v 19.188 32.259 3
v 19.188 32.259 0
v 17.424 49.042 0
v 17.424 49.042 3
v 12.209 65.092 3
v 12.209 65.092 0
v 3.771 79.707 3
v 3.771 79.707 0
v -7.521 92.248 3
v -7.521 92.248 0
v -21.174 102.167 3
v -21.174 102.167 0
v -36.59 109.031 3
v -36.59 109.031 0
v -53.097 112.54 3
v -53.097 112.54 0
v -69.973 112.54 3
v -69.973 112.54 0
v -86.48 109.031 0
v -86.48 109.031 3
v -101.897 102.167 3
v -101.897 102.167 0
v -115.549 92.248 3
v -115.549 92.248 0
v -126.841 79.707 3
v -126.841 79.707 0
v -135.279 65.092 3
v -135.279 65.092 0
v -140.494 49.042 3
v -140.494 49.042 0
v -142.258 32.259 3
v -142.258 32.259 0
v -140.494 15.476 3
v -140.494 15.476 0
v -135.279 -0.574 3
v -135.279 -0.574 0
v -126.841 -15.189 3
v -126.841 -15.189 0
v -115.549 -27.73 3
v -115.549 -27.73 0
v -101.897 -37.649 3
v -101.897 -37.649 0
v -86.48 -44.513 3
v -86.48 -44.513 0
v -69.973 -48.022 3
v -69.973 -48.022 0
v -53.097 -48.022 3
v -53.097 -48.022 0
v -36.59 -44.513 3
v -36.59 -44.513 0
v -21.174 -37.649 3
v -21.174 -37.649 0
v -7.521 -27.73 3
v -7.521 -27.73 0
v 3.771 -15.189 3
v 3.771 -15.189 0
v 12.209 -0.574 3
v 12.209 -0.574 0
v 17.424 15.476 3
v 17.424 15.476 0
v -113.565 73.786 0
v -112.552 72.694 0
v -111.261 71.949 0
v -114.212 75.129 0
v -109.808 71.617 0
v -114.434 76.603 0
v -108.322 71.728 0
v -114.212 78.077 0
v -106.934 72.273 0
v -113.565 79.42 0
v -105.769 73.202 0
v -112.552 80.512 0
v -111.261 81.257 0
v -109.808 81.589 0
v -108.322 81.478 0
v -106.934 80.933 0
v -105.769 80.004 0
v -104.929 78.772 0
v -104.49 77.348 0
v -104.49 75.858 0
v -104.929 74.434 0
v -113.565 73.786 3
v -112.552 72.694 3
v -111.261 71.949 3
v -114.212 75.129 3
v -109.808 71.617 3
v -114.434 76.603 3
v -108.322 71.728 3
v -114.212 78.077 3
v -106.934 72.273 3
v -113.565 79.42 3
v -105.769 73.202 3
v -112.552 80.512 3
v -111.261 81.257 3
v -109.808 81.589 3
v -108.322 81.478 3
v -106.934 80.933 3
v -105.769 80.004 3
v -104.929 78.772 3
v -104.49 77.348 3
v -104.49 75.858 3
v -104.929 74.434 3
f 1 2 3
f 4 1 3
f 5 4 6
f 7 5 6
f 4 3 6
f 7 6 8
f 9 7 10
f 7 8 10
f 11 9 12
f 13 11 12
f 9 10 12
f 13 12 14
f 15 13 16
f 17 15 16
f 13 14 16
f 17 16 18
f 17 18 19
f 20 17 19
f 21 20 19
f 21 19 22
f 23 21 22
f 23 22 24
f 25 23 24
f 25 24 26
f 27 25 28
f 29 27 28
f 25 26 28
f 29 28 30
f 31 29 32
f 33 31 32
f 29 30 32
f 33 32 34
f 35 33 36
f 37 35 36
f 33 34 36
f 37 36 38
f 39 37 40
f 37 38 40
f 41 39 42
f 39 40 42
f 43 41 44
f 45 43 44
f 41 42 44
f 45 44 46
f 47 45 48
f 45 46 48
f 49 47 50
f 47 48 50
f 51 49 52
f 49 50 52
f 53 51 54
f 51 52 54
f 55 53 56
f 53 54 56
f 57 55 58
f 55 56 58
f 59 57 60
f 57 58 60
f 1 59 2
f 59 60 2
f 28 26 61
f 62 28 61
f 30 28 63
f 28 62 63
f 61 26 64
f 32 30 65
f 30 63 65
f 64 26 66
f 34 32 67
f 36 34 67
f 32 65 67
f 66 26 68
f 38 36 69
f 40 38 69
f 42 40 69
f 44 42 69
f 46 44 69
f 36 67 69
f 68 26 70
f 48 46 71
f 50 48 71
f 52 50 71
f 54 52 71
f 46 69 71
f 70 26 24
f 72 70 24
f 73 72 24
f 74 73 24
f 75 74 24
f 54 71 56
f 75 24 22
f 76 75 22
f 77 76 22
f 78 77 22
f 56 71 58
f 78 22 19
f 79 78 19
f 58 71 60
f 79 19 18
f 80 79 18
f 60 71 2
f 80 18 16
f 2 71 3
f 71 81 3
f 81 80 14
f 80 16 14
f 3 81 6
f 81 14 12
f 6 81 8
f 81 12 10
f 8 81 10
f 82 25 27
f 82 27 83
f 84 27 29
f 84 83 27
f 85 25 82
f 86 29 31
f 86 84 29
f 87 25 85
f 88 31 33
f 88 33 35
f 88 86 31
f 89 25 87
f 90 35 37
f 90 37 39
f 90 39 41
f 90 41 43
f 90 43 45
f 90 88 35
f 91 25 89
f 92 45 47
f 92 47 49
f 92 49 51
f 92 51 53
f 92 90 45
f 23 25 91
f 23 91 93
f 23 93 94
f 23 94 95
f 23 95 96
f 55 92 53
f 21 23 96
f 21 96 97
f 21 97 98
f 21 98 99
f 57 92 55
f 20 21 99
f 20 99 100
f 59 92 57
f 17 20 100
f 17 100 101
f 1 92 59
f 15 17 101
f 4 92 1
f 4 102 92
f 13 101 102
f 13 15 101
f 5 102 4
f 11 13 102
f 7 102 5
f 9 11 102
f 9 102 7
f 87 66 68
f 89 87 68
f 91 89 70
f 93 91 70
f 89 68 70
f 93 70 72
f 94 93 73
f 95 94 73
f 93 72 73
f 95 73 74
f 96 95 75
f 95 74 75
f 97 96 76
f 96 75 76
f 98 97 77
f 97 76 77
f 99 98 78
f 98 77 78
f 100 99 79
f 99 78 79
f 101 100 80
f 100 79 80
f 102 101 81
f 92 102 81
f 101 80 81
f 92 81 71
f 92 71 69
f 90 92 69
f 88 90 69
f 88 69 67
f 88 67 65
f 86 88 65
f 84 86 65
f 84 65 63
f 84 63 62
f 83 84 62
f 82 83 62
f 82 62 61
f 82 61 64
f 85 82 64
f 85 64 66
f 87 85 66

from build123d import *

# Parameters (mm, degrees)
F0_R     = 80.723069
F1_DEPTH = 3
F2_R     = 3
F3_DEPTH = 3
F5_D     = 10


with BuildPart() as f1:
    # F0 (on Top) → F1 (new body)
    with BuildSketch(Plane.XY):
        with Locations((-61.535046, 32.258771)):
            Circle(F0_R)
    extrude(amount=F1_DEPTH)

    # F2 (on face) → F3 (join)
    with BuildSketch(Plane.XY.offset(3)):
        with Locations((-128.833771, 47.312688)):
            Circle(F2_R)
    extrude(amount=-F3_DEPTH)

    # F5 (through all)
    with Locations(Plane.XY.offset(3)):
        with Locations((-109.434292, 76.603003)):
            Hole(F5_D / 2)


solid = f1.part
